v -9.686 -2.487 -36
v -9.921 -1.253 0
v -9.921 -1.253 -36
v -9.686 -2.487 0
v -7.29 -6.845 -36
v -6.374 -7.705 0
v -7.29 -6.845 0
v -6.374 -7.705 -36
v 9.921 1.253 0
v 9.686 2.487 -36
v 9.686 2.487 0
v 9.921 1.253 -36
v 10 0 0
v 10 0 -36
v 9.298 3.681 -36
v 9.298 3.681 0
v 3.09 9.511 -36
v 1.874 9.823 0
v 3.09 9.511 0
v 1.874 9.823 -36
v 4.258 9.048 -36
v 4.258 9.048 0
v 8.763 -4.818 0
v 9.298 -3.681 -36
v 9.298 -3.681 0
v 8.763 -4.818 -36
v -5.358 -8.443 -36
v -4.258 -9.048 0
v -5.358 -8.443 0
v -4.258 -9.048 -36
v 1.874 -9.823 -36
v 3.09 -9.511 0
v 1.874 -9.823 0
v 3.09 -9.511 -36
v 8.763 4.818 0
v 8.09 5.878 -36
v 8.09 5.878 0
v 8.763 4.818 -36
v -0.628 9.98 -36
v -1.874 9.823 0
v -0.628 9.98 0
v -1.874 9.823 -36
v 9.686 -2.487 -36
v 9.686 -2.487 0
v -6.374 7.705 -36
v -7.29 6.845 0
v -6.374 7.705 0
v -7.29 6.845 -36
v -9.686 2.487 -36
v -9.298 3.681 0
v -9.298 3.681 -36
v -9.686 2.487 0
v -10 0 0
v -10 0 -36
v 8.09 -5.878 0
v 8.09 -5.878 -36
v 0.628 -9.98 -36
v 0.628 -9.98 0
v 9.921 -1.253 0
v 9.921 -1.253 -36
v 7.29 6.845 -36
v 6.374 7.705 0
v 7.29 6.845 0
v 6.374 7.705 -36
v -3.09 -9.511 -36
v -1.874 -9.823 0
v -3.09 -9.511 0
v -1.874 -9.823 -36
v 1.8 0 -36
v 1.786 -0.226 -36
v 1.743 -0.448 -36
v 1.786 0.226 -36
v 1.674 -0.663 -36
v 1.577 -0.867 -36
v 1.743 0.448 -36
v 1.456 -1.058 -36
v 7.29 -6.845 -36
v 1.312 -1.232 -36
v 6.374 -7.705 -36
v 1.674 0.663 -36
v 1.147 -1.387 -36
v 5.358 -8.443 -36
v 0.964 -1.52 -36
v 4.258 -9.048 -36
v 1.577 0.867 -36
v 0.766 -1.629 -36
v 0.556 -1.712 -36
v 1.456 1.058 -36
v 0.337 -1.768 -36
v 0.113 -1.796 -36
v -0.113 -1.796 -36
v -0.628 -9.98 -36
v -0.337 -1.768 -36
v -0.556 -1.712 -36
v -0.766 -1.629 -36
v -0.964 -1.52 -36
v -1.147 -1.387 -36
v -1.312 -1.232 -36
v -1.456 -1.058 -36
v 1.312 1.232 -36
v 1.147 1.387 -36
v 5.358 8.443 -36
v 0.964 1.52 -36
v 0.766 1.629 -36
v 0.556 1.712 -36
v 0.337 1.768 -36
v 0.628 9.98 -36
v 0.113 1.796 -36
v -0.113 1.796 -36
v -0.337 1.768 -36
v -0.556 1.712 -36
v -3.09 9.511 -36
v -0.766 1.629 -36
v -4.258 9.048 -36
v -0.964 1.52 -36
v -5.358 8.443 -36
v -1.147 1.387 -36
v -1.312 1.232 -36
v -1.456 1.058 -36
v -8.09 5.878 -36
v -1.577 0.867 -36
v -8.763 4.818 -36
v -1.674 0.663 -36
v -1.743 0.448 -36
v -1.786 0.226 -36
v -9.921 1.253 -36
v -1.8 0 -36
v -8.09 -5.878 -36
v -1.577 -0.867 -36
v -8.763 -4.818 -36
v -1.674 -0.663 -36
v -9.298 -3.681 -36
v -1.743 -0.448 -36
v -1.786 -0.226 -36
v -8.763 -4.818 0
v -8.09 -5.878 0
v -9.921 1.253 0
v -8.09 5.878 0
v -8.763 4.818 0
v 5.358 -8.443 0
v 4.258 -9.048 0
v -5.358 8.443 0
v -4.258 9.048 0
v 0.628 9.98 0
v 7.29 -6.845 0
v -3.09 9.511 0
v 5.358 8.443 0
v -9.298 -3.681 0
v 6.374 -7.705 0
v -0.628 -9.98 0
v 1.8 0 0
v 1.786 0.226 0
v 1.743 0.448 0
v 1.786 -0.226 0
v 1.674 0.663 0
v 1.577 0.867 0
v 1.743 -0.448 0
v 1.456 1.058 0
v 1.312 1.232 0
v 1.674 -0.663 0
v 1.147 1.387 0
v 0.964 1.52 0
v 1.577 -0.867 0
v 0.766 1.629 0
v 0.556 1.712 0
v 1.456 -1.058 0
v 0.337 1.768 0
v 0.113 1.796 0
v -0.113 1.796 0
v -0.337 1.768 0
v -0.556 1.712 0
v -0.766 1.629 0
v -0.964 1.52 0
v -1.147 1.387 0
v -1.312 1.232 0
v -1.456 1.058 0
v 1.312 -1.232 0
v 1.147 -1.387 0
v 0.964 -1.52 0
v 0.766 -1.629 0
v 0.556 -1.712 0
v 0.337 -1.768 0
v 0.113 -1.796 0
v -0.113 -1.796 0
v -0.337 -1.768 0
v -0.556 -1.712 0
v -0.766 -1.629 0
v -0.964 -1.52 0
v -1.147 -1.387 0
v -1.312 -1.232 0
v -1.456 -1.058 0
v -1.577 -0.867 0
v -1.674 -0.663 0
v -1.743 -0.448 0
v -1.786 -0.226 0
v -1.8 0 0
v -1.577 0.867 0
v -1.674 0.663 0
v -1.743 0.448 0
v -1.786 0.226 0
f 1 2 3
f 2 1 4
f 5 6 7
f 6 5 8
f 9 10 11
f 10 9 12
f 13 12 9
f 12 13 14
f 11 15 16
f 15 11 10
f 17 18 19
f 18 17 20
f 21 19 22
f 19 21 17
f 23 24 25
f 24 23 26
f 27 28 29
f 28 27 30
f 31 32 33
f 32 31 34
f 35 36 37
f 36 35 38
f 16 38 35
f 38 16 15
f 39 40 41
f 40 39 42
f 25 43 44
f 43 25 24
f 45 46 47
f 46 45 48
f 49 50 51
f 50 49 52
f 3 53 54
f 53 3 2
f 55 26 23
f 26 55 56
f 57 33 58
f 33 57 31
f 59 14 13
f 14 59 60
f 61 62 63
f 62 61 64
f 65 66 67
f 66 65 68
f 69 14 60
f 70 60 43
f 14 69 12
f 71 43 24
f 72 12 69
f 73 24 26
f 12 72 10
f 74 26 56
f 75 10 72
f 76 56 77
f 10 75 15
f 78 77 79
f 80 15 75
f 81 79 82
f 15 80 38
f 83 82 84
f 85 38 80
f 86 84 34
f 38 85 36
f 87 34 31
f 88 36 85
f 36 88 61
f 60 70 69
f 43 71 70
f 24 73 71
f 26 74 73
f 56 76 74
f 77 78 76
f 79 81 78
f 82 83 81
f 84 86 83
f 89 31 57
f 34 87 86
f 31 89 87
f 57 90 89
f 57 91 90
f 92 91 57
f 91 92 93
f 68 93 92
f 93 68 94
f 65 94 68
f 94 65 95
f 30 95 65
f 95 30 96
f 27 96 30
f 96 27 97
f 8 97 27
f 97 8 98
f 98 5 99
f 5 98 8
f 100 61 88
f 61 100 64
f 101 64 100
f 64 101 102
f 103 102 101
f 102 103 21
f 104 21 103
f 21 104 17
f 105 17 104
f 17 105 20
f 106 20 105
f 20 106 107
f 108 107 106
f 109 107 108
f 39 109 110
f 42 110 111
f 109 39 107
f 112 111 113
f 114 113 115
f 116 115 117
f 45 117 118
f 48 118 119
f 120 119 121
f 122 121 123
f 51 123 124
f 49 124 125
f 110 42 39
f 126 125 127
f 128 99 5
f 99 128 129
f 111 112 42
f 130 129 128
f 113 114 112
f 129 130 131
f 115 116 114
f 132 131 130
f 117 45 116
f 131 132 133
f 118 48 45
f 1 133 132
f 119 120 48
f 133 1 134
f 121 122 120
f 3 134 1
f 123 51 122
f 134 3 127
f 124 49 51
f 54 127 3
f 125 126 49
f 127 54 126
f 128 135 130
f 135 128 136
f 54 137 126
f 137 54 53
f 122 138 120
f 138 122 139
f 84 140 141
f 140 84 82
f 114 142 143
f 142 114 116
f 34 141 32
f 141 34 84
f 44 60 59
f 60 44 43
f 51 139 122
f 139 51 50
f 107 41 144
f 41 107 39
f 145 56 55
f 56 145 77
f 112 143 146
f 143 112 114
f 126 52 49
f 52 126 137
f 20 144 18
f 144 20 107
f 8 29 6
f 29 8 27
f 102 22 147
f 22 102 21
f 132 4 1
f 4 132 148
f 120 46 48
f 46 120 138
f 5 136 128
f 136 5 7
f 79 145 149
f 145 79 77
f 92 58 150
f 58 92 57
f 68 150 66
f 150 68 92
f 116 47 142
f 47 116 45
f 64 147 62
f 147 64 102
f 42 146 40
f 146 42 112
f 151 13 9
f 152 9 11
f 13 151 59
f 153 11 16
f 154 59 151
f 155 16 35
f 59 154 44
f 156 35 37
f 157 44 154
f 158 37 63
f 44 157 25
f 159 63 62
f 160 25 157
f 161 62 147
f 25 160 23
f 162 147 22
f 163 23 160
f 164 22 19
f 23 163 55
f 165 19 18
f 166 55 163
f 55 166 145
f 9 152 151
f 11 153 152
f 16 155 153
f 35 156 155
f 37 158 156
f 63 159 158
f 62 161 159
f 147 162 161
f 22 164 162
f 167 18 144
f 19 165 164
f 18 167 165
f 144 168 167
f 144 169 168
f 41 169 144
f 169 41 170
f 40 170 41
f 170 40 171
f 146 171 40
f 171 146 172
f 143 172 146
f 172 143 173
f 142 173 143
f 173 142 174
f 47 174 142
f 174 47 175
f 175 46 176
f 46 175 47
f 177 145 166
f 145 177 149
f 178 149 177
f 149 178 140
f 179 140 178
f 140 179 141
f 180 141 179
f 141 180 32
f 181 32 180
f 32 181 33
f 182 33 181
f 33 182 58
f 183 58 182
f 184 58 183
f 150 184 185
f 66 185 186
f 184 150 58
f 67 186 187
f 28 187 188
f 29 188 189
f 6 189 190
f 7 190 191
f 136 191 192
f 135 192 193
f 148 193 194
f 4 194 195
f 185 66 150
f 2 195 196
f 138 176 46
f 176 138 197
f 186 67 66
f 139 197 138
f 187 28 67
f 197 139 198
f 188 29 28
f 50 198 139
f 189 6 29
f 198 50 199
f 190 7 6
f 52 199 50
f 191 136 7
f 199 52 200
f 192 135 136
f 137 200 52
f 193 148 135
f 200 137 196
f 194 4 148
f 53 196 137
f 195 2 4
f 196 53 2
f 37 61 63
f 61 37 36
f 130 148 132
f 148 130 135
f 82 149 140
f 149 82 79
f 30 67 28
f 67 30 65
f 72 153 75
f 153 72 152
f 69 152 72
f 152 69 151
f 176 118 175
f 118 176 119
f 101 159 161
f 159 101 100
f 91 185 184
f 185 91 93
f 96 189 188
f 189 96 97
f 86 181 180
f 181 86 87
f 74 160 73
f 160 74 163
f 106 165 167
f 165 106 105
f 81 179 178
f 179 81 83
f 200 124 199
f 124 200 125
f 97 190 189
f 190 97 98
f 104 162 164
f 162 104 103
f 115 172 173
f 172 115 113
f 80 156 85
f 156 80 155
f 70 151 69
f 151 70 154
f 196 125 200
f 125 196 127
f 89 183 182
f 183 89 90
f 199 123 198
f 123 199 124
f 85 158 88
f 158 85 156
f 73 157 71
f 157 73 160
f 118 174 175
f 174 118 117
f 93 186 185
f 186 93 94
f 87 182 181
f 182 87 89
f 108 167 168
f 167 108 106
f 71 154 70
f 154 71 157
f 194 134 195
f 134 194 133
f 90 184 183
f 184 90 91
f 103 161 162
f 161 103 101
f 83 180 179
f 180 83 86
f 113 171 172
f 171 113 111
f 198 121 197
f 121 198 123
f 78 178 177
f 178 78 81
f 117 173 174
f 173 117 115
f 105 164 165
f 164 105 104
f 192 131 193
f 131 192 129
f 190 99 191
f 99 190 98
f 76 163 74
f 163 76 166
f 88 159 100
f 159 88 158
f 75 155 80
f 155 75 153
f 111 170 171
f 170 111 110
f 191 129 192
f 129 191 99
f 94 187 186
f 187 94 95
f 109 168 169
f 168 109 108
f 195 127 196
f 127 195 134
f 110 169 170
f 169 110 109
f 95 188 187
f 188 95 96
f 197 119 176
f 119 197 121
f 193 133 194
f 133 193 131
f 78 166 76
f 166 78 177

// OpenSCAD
$fn = 50;


difference() {
	union() {
		translate(v = [0, 0, -36.0000000000]) {
			cylinder(h = 36, r = 10.0000000000);
		}
		cylinder(h = 0, r = 20.0000000000);
	}
	union() {
		#translate(v = [0, 0, -36]) {
			cylinder(h = 36, r = 1.8000000000);
		}
	}
}
